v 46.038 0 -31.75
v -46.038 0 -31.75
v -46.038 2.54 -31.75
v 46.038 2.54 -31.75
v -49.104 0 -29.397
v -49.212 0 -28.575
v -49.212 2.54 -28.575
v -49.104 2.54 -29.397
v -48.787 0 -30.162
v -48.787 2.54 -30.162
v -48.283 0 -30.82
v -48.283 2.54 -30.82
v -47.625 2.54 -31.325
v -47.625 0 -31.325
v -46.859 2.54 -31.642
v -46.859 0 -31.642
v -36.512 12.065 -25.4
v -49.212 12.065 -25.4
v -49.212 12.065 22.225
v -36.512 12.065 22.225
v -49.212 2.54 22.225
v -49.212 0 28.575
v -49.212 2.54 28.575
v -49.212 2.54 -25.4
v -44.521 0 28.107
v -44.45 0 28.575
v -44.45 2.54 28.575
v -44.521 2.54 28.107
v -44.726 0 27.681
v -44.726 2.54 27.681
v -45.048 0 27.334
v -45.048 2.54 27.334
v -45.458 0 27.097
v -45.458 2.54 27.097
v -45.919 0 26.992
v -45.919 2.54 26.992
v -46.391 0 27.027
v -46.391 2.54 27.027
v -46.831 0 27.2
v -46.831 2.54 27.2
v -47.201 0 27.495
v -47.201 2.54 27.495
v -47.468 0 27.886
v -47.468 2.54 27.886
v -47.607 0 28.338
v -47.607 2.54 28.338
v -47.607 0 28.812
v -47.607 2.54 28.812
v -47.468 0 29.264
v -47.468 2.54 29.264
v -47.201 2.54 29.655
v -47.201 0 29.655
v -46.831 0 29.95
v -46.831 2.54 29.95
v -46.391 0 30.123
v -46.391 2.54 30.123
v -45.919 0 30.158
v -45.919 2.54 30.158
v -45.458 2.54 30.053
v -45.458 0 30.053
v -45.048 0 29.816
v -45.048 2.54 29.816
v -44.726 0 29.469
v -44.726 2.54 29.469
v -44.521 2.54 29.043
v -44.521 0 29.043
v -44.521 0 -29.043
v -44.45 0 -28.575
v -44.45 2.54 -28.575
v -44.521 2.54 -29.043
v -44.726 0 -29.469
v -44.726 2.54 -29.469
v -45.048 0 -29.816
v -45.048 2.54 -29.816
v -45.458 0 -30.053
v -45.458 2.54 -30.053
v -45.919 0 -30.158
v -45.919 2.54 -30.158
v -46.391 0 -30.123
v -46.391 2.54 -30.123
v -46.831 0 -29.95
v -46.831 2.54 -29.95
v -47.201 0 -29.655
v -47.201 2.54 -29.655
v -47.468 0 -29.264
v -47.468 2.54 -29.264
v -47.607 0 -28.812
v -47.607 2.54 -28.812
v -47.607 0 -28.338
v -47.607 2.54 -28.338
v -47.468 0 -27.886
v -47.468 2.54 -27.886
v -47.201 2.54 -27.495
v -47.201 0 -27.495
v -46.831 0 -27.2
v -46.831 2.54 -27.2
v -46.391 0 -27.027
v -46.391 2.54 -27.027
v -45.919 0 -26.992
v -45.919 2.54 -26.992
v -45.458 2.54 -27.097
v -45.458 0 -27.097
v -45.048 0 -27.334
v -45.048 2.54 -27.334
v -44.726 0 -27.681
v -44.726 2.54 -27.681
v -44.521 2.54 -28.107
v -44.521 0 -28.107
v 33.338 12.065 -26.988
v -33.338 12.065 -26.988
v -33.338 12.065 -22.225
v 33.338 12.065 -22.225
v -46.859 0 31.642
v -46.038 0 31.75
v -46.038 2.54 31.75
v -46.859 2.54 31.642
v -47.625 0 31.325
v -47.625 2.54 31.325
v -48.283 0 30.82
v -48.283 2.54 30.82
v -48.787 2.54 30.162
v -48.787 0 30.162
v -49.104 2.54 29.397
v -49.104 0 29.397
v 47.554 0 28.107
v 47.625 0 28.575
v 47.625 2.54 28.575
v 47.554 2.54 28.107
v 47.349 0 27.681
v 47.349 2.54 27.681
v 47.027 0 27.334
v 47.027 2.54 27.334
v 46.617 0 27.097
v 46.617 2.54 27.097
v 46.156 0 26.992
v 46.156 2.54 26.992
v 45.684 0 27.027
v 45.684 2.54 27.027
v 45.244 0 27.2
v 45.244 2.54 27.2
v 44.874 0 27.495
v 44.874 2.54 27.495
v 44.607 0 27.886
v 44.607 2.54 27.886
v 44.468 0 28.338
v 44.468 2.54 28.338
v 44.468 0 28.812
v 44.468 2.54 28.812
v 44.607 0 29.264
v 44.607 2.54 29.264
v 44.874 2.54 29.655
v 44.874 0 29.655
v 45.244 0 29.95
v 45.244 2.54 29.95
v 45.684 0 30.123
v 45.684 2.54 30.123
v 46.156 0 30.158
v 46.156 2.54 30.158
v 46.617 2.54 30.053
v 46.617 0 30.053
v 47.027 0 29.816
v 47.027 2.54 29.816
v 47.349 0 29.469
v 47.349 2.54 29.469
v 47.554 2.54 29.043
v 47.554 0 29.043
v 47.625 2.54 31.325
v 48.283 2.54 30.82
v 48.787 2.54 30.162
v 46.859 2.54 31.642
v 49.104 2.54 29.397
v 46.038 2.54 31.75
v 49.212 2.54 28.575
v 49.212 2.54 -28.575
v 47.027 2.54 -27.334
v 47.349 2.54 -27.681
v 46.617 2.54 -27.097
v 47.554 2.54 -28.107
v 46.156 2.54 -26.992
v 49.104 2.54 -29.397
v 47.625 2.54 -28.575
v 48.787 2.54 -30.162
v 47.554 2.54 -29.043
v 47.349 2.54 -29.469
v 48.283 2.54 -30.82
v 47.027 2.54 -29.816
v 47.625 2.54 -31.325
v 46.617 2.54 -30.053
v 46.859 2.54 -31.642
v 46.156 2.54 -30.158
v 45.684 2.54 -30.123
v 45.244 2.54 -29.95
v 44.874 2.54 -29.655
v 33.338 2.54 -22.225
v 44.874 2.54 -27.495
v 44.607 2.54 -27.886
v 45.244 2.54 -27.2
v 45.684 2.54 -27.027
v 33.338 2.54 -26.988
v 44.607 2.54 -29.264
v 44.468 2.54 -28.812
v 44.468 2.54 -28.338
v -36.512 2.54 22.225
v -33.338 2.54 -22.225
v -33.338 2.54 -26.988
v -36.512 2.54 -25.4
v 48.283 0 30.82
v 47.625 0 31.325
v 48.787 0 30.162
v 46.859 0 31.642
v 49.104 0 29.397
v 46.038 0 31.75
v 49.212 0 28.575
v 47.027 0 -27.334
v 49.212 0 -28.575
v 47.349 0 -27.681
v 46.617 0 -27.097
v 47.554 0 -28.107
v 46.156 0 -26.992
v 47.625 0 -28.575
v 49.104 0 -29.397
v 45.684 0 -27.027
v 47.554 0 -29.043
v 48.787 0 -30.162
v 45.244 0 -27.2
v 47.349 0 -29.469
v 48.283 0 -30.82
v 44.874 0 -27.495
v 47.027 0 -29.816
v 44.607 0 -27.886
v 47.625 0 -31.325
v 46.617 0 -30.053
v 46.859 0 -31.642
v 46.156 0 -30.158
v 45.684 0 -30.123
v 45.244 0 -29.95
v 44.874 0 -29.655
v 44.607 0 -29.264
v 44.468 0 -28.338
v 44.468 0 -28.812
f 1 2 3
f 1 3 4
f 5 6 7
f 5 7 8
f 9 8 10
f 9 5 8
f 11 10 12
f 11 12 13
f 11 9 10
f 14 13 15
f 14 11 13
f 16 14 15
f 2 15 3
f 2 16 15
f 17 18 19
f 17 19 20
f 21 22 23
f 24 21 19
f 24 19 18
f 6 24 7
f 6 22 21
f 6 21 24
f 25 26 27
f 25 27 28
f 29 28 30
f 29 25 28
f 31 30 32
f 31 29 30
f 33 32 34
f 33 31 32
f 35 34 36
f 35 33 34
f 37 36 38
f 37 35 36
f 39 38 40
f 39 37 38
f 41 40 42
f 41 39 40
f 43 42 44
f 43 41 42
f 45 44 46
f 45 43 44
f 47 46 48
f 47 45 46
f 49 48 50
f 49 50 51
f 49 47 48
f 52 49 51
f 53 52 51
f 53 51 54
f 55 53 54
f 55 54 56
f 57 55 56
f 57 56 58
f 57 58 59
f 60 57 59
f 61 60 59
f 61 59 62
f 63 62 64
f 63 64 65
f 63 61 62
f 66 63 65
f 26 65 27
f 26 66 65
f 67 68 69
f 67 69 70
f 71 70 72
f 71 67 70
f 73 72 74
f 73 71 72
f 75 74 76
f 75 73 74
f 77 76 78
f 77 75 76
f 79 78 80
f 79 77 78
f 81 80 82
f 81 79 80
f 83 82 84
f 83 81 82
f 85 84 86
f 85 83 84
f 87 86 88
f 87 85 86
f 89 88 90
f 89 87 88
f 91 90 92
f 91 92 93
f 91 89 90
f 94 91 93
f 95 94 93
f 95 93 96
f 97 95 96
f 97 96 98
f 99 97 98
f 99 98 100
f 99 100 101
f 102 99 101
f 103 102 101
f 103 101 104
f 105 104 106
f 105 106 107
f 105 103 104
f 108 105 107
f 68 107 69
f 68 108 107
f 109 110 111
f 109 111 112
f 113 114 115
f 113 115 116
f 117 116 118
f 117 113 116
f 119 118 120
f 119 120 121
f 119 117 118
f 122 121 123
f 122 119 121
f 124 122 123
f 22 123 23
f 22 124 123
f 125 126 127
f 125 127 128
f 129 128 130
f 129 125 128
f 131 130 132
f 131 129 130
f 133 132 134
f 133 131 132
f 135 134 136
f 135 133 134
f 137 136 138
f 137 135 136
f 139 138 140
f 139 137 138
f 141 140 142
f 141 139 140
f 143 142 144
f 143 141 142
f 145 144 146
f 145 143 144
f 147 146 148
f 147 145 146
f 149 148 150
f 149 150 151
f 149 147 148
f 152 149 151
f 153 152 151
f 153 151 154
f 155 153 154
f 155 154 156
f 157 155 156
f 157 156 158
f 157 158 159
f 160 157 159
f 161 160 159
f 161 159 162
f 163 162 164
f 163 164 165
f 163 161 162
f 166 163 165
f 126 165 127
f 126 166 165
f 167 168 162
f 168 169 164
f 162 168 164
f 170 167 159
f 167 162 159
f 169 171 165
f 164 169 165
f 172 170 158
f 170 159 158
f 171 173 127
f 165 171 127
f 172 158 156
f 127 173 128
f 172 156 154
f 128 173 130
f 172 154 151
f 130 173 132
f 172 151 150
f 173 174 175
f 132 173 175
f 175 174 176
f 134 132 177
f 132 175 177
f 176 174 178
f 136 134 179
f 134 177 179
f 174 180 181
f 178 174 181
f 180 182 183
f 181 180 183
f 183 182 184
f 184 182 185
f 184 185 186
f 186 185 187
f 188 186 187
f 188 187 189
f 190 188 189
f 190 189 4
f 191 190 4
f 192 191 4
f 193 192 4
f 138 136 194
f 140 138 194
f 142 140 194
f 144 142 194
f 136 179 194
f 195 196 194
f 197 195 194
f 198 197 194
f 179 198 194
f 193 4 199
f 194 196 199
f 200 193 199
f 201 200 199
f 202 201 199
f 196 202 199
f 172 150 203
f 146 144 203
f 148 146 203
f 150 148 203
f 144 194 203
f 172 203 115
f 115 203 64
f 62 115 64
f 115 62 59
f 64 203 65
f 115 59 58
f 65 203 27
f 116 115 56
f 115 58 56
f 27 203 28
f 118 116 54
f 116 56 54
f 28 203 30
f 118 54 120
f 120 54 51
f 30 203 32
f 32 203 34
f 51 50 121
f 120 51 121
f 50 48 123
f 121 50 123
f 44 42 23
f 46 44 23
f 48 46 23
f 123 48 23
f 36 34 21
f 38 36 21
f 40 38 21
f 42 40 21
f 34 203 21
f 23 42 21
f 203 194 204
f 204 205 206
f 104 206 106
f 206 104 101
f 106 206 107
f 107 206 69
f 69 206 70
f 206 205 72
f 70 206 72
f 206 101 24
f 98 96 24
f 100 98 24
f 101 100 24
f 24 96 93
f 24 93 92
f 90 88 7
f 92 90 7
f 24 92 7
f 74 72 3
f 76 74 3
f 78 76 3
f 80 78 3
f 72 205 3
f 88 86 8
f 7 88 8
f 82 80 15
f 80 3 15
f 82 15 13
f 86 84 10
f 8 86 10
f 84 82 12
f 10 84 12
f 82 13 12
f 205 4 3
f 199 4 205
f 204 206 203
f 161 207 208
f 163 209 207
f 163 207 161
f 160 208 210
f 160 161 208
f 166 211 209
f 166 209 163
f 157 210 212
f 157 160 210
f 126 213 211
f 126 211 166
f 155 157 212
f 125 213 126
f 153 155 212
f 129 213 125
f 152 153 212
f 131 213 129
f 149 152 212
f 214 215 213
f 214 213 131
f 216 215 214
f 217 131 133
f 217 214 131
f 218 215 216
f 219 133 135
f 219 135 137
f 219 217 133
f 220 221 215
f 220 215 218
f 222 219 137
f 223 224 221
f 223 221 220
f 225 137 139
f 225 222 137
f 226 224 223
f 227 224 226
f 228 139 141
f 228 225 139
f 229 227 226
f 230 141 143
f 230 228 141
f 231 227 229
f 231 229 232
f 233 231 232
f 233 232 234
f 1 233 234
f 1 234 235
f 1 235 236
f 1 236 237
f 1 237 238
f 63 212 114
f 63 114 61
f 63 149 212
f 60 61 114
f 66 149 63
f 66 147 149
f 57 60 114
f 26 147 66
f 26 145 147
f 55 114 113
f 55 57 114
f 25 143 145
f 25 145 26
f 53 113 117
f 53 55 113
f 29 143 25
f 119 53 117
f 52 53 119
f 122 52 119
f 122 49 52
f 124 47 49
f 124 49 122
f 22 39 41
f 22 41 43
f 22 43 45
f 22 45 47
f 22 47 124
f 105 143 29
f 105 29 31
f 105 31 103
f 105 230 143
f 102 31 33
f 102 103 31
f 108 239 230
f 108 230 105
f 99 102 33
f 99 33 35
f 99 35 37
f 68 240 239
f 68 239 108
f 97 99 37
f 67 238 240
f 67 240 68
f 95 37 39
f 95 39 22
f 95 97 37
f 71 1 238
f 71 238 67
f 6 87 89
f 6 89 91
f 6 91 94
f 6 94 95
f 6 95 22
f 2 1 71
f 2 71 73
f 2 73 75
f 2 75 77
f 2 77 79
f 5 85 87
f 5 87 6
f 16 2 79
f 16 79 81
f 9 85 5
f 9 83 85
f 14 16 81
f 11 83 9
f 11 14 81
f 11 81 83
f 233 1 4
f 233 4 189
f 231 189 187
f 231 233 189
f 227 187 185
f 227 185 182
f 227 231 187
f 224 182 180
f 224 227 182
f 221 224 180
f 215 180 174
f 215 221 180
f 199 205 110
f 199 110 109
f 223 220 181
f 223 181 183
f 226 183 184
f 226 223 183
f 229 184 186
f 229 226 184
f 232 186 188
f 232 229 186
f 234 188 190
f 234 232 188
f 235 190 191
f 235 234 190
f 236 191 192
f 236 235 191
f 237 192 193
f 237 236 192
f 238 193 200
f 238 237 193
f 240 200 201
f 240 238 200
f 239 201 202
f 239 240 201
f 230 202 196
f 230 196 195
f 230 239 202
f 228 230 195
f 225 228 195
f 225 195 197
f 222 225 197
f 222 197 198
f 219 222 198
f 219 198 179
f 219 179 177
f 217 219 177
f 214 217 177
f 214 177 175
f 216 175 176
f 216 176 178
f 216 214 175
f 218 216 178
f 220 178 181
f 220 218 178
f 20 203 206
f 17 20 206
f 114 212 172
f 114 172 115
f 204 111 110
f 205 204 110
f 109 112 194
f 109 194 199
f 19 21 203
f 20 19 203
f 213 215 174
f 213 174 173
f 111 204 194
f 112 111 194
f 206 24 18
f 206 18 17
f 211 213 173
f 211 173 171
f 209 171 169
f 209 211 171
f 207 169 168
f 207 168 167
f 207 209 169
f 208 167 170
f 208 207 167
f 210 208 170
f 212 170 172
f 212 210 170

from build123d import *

# Parameters (mm, degrees)
SKETCH1_R                    = 1.5875
MAINPCB_DEPTH                = 2.54
SKETCH2_W                    = 12.7
SKETCH2_H                    = 47.625
CHARGER_USBCONNECTIONS_DEPTH = 9.525
SKETCH3_W                    = 66.675
SKETCH3_H                    = 4.7625
GPIO_HEADER_DEPTH            = 9.525


with BuildPart() as part:
    # Sketch1 → MainPCB (new body)
    with BuildSketch(Plane(origin=(0, 0, 0), x_dir=(1, 0, 0), z_dir=(0, 1, 0))):
        with BuildLine():
            Line((-46.0375, 31.75), (46.0375, 31.75))
            ThreePointArc((46.0375, 31.75), (48.28256403, 30.82006403), (49.2125, 28.575))
            Line((49.2125, 28.575), (49.2125, -28.575))
            ThreePointArc((49.2125, -28.575), (48.28256403, -30.82006403), (46.0375, -31.75))
            Line((46.0375, -31.75), (-46.0375, -31.75))
            ThreePointArc((-46.0375, -31.75), (-48.28256403, -30.82006403), (-49.2125, -28.575))
            Line((-49.2125, -28.575), (-49.2125, 28.575))
            ThreePointArc((-49.2125, 28.575), (-48.28256403, 30.82006403), (-46.0375, 31.75))
        make_face()
        with Locations((-46.0375, 28.575)):
            Circle(SKETCH1_R, mode=Mode.SUBTRACT)
        with Locations((46.0375, 28.575)):
            Circle(SKETCH1_R, mode=Mode.SUBTRACT)
        with Locations((46.0375, -28.575)):
            Circle(SKETCH1_R, mode=Mode.SUBTRACT)
        with Locations((-46.0375, -28.575)):
            Circle(SKETCH1_R, mode=Mode.SUBTRACT)
    extrude(amount=MAINPCB_DEPTH)

    # Sketch2 → Charger_USBConnections (add)
    with BuildSketch(Plane(origin=(0, 2.54, 0), x_dir=(1, 0, 0), z_dir=(0, 1, 0))):
        with Locations((-42.8625, 1.5875)):
            Rectangle(SKETCH2_W, SKETCH2_H)
    extrude(amount=CHARGER_USBCONNECTIONS_DEPTH)

    # Sketch3 → GPIO Header (add)
    with BuildSketch(Plane(origin=(0, 2.54, 0), x_dir=(1, 0, 0), z_dir=(0, 1, 0))):
        with Locations((0, 24.60625)):
            Rectangle(SKETCH3_W, SKETCH3_H)
    extrude(amount=GPIO_HEADER_DEPTH)


solid = part.part
